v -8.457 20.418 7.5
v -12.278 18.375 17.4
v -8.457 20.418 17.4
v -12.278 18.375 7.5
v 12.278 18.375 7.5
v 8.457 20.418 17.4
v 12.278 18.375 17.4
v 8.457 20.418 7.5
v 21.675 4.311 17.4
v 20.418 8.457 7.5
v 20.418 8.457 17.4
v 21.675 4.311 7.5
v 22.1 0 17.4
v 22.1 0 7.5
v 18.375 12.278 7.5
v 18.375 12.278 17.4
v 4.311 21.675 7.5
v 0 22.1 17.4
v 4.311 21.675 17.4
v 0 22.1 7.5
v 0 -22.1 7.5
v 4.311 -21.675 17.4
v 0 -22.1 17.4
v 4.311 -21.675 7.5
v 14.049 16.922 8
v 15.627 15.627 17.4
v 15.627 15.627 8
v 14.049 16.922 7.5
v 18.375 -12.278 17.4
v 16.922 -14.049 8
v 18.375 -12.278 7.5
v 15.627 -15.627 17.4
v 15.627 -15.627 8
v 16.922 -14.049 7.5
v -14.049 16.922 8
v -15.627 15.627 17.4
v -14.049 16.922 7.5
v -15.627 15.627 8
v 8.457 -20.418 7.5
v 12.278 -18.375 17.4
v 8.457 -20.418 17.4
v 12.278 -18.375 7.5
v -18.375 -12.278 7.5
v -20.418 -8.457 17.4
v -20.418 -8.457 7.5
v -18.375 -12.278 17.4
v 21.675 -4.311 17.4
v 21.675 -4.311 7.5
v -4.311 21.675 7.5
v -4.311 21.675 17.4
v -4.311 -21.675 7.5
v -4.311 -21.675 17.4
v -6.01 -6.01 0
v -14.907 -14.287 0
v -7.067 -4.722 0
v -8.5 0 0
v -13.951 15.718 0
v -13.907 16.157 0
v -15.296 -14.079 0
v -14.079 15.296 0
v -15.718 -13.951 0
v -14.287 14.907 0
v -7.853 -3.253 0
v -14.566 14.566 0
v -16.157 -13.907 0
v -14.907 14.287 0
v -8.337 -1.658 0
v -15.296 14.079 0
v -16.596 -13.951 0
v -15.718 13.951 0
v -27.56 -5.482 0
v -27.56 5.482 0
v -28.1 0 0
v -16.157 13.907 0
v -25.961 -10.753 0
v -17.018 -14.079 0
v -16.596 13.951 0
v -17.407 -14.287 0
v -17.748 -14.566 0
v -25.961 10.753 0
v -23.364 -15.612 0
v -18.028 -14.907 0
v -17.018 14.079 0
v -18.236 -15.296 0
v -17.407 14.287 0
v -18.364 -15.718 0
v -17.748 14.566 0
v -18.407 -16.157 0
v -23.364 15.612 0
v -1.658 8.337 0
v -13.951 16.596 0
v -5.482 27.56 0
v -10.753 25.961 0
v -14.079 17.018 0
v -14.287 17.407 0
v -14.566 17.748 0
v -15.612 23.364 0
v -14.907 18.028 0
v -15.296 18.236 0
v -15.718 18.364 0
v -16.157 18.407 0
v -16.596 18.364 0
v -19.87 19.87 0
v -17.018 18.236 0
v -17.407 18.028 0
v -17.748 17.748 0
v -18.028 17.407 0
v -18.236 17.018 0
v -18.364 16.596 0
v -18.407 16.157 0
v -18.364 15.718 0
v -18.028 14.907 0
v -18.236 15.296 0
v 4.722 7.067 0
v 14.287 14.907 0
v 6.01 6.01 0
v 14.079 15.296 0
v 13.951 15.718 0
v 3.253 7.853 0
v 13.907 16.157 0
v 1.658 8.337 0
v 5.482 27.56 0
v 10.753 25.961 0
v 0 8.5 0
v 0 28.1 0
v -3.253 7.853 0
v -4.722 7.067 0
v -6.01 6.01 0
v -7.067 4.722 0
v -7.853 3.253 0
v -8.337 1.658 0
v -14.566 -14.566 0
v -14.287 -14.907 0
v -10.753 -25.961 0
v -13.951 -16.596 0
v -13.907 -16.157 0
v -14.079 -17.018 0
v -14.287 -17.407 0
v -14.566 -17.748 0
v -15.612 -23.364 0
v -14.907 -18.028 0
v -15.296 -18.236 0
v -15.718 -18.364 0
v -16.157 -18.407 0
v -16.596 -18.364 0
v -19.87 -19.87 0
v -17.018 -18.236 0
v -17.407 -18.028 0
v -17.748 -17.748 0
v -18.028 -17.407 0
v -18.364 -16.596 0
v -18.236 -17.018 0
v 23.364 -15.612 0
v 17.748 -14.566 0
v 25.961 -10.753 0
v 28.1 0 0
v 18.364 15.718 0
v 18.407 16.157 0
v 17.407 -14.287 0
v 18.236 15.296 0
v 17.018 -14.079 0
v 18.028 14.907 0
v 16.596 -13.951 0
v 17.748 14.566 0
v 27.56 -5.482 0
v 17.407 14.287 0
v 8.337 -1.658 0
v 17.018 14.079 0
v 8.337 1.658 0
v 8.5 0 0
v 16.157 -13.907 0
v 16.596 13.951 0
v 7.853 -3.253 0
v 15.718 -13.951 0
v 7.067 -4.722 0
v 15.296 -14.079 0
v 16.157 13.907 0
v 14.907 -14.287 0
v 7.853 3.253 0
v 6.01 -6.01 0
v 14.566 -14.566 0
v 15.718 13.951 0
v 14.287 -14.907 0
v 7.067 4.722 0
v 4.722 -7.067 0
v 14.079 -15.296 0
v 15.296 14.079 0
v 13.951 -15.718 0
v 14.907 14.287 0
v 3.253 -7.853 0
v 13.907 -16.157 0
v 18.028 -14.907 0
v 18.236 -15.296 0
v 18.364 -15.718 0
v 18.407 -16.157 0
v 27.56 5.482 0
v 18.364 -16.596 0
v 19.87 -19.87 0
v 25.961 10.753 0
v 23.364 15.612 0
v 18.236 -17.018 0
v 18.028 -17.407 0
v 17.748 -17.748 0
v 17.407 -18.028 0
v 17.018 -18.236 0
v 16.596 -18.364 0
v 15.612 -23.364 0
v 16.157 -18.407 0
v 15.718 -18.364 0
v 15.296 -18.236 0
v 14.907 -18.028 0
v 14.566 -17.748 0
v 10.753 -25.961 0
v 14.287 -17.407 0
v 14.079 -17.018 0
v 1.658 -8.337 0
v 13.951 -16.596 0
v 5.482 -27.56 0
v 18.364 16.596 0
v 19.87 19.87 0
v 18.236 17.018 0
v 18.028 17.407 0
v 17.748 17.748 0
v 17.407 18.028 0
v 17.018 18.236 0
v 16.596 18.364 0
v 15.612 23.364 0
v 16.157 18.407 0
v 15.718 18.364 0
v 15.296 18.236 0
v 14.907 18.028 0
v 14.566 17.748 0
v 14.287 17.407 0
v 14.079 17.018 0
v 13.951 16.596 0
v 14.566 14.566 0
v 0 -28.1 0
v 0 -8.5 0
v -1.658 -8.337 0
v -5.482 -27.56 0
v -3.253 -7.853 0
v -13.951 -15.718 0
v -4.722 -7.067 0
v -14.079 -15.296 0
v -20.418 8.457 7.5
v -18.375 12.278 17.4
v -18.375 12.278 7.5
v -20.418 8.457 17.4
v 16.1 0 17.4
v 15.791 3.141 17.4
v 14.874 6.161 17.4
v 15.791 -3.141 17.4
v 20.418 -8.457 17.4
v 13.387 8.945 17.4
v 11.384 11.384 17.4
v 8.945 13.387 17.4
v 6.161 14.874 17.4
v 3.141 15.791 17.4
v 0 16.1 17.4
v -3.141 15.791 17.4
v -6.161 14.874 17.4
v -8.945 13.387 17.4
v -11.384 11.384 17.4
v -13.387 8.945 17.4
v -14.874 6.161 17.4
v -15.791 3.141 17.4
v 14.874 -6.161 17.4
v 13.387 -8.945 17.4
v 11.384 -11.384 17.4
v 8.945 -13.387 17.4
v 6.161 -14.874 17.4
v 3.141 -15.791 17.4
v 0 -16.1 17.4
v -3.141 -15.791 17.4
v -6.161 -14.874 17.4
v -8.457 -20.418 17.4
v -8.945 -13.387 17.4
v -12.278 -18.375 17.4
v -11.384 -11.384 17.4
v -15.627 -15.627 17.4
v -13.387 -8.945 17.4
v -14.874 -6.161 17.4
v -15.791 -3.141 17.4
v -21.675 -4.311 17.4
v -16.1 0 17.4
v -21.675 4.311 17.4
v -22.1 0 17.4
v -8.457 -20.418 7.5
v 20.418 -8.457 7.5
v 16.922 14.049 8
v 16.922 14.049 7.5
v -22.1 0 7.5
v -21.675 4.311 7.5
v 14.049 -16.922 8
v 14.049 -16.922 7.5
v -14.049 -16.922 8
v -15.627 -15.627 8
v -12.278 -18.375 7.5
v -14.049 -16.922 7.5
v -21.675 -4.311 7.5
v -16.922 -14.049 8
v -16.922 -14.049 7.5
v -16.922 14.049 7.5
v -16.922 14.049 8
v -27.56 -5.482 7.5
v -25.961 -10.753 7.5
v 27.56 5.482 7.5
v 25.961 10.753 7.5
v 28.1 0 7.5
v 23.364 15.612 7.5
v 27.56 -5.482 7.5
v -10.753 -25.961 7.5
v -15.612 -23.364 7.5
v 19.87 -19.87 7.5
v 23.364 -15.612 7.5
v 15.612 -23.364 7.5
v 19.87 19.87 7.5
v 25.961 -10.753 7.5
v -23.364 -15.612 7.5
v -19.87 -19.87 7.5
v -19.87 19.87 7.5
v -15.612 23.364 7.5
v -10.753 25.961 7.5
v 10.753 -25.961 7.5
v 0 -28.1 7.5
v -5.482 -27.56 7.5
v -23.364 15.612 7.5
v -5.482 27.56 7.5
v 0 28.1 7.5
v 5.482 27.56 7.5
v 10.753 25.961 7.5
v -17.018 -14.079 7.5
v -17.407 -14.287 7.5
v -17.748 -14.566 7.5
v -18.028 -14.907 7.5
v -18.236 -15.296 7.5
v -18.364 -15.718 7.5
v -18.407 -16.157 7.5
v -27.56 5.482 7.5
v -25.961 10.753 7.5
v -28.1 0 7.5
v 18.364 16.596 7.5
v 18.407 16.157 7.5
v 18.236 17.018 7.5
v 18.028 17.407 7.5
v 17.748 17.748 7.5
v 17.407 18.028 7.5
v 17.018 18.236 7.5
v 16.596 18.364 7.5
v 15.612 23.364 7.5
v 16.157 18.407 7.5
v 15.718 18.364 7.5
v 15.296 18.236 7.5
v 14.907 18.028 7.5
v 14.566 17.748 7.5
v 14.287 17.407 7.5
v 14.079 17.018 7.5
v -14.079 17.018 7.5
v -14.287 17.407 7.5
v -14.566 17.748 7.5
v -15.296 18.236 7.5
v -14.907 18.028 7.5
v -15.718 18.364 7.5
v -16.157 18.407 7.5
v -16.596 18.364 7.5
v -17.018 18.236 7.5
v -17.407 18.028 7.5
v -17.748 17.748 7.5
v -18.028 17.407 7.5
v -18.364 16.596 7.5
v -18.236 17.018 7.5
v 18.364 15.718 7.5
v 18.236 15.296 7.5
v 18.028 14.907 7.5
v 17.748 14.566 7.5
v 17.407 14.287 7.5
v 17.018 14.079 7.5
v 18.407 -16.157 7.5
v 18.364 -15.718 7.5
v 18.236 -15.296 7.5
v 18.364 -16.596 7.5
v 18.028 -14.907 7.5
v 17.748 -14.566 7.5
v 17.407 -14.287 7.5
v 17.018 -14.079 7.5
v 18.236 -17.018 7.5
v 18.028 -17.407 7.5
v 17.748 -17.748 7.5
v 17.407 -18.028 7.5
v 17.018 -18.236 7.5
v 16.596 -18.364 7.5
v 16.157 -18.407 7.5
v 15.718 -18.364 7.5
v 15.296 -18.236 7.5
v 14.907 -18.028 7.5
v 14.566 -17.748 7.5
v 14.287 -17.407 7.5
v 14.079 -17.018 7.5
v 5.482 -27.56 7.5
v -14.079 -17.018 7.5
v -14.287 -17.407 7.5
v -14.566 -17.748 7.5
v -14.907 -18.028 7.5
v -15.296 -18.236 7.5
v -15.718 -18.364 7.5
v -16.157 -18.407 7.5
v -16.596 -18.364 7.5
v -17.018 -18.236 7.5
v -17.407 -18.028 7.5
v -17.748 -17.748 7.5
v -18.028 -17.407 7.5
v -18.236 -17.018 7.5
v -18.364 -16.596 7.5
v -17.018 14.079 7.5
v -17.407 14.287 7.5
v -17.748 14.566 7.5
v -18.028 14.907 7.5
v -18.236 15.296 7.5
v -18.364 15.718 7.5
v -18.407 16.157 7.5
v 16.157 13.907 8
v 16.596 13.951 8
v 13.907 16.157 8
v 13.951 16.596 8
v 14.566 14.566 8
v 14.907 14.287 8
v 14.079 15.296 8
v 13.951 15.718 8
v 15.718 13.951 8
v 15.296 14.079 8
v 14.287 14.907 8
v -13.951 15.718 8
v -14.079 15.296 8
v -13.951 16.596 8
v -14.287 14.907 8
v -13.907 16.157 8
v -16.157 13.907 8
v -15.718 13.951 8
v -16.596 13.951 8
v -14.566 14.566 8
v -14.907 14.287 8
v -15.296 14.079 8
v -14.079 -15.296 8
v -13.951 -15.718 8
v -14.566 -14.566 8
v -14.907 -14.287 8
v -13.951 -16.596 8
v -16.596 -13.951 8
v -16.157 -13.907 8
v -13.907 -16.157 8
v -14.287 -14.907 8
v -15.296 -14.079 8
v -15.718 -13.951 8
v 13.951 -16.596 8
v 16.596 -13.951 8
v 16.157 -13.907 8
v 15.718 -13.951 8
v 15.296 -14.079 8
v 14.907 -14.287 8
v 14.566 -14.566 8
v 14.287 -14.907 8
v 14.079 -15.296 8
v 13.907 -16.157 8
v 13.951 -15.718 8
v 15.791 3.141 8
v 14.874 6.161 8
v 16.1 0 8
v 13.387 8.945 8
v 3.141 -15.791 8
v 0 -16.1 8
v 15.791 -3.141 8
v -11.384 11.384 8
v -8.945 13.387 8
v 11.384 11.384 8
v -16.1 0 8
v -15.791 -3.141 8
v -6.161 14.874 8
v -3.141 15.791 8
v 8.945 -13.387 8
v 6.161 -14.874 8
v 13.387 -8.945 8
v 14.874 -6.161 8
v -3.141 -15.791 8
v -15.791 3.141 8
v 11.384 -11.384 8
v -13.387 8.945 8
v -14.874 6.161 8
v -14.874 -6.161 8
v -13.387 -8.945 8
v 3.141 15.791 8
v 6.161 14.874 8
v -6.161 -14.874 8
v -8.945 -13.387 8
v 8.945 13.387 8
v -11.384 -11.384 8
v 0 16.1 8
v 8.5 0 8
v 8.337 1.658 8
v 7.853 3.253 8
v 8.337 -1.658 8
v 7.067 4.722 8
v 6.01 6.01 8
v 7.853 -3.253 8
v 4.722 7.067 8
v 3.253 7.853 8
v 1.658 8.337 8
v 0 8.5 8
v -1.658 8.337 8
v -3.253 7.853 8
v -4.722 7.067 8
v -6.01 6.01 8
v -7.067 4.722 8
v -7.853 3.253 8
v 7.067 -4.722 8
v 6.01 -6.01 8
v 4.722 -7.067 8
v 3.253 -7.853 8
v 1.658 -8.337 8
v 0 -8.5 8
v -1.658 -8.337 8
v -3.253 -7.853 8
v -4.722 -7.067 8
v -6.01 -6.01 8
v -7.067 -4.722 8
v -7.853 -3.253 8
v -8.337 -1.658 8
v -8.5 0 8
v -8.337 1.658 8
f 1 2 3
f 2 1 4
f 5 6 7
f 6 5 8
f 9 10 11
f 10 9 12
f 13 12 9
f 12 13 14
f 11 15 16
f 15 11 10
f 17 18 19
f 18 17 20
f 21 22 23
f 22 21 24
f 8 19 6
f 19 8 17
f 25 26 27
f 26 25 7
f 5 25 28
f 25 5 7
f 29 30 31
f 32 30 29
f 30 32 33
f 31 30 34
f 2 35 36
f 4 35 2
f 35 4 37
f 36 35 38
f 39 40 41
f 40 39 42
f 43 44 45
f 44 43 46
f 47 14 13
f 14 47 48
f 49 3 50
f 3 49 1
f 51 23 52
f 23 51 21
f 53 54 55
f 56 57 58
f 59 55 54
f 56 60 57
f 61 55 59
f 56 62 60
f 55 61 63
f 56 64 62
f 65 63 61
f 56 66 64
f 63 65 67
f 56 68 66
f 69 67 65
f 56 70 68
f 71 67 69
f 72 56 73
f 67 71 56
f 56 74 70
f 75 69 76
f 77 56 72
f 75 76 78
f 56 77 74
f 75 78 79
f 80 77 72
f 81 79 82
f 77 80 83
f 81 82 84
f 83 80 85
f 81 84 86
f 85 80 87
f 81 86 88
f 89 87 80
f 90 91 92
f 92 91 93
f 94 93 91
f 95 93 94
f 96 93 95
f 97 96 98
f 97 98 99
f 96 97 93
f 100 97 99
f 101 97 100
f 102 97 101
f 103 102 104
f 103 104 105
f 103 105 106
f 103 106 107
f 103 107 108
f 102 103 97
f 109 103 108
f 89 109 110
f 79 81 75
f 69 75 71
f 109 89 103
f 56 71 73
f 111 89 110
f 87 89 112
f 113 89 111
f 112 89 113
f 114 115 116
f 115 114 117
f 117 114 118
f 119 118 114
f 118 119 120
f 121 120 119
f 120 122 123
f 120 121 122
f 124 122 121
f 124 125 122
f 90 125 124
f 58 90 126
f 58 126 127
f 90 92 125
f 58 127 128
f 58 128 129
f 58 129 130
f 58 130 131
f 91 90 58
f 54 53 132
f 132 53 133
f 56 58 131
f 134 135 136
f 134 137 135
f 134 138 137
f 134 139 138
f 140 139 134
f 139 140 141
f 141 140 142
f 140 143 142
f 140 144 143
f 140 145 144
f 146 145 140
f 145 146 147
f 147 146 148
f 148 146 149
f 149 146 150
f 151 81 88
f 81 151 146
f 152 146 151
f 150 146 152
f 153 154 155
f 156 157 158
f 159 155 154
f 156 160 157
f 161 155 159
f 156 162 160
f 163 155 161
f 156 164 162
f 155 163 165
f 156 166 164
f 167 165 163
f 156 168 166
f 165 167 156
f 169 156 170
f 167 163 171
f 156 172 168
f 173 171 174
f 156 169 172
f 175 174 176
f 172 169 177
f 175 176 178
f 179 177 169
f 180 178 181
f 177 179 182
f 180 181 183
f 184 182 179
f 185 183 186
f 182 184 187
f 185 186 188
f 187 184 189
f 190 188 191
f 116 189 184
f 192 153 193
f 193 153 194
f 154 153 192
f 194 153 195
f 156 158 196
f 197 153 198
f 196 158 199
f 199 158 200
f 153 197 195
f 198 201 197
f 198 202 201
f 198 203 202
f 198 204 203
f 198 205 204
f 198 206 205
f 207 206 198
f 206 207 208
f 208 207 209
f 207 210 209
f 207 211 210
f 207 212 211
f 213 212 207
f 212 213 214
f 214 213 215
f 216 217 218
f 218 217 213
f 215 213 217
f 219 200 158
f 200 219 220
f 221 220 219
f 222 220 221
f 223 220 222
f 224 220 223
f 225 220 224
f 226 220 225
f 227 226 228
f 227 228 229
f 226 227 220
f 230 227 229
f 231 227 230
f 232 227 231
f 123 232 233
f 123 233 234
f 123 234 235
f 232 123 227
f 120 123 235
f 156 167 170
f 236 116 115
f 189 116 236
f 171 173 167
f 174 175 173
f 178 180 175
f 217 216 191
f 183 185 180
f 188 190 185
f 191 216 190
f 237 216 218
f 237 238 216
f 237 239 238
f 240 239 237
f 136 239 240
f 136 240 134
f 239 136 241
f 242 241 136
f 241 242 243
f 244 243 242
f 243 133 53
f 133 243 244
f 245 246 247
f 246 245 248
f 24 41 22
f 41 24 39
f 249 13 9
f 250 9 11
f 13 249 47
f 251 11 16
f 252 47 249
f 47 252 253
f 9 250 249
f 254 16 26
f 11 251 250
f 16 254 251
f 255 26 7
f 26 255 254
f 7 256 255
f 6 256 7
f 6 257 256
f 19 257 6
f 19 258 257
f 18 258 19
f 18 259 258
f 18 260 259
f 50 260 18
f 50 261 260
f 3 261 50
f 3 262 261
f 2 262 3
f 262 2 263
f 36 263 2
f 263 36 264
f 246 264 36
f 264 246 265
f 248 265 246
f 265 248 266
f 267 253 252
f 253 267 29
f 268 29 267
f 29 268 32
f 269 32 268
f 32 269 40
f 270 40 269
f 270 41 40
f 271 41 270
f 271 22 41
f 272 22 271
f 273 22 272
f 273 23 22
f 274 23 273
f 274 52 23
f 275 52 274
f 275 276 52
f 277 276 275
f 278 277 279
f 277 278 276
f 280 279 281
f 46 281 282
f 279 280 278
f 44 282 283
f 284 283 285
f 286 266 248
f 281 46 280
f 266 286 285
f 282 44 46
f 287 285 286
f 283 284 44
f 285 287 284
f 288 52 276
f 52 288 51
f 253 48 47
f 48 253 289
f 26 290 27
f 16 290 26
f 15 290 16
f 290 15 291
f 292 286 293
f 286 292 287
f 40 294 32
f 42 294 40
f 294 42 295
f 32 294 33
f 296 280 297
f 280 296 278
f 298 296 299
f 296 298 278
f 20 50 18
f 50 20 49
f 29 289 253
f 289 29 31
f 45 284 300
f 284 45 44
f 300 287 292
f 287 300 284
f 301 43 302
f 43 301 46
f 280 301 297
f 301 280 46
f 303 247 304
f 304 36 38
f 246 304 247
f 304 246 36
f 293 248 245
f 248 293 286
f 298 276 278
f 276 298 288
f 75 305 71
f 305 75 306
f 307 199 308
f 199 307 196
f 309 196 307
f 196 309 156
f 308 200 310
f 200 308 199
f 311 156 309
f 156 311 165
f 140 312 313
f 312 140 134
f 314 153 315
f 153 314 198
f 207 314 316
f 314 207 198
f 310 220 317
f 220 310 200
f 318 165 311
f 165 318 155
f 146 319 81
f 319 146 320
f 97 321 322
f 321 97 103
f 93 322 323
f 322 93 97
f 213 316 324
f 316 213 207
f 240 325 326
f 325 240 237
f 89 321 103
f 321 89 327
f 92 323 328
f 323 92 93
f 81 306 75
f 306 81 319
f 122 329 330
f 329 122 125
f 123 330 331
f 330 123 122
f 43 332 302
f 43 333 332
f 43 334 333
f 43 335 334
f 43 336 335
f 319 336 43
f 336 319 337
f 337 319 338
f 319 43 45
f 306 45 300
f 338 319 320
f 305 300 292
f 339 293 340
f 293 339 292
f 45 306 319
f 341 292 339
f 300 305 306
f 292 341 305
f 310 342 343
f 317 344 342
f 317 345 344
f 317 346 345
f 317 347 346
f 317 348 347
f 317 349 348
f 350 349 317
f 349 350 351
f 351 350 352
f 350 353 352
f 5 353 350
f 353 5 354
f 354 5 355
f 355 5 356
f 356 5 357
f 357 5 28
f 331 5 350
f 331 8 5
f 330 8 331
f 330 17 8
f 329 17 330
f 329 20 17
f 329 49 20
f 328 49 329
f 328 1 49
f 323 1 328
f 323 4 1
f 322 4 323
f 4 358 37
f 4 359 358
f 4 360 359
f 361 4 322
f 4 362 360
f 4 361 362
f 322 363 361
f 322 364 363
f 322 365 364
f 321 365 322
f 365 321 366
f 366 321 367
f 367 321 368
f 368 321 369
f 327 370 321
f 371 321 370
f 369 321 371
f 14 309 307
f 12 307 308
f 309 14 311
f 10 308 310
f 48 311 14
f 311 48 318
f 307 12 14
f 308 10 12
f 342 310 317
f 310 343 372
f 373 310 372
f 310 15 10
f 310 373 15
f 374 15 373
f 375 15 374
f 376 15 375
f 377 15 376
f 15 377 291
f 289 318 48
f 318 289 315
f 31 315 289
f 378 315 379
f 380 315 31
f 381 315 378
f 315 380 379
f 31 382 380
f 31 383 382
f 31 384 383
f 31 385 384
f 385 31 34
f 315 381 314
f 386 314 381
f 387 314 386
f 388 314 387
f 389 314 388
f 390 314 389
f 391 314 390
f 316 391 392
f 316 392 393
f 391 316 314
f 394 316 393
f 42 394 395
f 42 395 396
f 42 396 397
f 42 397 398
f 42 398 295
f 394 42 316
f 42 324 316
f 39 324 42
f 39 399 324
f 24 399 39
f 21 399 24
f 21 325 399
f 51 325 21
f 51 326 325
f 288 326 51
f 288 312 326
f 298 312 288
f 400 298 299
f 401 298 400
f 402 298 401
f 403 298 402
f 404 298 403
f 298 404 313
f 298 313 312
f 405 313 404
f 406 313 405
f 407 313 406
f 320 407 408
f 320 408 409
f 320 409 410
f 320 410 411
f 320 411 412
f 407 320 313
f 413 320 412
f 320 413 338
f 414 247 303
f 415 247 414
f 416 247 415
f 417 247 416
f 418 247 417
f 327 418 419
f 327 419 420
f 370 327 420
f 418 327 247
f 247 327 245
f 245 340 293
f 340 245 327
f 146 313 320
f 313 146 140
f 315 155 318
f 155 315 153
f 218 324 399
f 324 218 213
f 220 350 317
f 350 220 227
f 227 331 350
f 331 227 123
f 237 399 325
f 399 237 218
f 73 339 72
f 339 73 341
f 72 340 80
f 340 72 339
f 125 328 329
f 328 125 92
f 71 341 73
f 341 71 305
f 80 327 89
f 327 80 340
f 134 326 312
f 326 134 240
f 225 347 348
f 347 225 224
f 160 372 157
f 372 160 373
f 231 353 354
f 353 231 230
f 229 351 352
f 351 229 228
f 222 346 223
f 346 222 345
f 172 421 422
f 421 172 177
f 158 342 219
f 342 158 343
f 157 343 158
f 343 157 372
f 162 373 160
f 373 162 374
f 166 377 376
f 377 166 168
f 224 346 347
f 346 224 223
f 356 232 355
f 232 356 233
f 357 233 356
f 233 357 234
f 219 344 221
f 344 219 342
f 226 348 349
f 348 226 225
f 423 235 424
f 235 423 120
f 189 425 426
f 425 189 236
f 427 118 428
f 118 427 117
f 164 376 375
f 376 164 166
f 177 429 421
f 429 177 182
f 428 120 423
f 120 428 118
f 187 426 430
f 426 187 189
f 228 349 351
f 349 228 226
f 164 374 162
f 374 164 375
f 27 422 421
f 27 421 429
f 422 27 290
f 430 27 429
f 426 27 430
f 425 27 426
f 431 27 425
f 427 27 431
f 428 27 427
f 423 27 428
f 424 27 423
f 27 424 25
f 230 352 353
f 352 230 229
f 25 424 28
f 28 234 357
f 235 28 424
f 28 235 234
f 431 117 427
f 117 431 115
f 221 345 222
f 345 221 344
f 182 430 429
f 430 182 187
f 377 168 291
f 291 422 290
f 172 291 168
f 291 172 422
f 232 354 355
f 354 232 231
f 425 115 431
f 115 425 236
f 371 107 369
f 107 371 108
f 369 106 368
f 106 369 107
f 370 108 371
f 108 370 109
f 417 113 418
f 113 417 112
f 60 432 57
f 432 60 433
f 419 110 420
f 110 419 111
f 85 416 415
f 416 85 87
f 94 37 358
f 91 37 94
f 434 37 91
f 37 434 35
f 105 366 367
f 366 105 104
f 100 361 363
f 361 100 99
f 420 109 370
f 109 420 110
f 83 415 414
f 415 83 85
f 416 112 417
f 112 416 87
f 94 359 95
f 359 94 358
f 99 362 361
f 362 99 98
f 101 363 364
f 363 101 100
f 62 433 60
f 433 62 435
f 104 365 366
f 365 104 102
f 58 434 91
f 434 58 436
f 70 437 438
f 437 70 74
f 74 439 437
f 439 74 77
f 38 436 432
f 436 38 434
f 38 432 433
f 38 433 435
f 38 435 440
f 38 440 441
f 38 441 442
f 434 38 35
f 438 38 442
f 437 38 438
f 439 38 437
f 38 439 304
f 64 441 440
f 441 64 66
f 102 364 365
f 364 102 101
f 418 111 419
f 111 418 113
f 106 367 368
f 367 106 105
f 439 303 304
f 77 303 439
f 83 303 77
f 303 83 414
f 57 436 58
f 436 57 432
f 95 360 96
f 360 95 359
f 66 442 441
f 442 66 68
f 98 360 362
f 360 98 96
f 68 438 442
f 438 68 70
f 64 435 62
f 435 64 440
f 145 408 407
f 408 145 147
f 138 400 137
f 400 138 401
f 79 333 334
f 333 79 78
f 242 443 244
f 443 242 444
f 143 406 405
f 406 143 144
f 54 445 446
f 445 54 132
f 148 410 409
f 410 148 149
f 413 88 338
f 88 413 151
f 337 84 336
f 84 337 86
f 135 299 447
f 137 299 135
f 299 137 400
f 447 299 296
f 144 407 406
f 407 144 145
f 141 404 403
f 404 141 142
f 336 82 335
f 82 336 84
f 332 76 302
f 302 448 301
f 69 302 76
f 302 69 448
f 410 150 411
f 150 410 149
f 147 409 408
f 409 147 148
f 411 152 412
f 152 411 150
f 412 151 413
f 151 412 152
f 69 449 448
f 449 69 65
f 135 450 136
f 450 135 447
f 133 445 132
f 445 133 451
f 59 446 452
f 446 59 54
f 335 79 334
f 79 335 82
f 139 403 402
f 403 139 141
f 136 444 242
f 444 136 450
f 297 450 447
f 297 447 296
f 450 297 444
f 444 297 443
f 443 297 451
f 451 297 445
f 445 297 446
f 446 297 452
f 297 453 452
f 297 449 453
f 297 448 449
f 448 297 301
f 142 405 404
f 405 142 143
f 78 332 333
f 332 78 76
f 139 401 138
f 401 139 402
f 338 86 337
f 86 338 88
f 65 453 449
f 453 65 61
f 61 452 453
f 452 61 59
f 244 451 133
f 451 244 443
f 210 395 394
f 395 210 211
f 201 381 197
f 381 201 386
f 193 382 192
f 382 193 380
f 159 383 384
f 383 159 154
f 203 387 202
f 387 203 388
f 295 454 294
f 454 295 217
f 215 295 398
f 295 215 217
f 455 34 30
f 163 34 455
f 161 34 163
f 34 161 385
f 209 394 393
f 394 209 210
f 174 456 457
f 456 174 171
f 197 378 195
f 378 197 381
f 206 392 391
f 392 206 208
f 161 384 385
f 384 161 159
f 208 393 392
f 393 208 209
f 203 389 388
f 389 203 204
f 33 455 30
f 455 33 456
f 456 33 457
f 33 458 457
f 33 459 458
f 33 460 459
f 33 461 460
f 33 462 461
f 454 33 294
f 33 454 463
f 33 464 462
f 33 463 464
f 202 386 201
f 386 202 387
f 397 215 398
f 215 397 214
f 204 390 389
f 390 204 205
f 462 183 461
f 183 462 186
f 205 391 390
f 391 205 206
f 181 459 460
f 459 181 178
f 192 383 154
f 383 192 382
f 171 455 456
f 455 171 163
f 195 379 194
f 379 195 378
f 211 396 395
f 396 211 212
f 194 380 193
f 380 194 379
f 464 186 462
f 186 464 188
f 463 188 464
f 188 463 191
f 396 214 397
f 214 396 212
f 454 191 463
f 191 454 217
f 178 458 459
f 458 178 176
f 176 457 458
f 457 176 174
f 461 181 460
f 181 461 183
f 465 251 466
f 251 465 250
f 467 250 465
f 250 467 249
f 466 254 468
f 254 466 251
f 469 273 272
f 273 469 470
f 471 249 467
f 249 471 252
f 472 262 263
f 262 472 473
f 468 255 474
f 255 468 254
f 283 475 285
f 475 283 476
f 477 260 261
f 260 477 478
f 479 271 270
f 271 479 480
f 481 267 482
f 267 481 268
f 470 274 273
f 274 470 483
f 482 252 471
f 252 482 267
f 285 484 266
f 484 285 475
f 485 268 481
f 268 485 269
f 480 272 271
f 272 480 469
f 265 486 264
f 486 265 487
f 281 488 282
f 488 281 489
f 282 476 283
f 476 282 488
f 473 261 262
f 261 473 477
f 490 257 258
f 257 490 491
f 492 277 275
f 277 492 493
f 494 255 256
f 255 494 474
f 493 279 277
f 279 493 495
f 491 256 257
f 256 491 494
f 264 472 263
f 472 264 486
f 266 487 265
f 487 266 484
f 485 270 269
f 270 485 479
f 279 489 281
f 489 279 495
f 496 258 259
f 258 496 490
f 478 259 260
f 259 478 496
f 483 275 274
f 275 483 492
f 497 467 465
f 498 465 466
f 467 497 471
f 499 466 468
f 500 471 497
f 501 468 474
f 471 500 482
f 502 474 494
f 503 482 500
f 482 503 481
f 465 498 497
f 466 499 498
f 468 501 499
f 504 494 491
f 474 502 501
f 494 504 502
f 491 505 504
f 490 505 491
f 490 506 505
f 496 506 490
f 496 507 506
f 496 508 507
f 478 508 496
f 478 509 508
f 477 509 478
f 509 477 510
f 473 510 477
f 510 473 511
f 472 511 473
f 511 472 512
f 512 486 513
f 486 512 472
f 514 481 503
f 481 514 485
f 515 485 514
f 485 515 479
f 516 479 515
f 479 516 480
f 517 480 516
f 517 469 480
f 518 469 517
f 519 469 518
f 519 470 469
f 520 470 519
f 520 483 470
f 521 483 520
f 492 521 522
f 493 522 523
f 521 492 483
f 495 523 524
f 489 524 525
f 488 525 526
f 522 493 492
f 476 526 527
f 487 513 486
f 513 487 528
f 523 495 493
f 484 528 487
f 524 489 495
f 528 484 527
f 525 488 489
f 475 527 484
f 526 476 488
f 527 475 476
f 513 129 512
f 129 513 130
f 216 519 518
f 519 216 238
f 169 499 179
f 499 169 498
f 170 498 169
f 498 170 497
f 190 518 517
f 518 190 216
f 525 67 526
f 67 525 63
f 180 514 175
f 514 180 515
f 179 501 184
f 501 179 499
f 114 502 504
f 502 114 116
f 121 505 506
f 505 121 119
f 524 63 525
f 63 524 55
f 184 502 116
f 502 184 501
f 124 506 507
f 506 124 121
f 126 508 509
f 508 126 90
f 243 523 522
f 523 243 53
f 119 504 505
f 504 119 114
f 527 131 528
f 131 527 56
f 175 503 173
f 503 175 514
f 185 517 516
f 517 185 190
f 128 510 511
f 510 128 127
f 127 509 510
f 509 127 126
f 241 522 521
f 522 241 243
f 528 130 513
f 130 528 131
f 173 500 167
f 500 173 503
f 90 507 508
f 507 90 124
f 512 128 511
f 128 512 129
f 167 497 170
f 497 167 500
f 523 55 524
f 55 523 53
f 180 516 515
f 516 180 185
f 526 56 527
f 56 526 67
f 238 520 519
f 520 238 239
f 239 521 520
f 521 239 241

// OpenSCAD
$fn = 32;

// ----------------------------------------------------------------------
// Bearing housing: seat for 6002 (32 x 9 mm), 44.2 mm body
// ----------------------------------------------------------------------

// --- parameters (mm) ---
case_d = 44.2;            // housing outside diameter
case_h = 17.4;            // overall housing height
rim_t = 6;                // wall thickness
bearing_seat = 32.2;      // 6002 seat, 0.2 mm clearance
seat_h = 9.4;             // pocket depth
shoulder = 2;             // shoulder under the bearing
pass_d = 17;              // shaft passage
ear_d = 56.2;             // mounting flange diameter
flange_t = 6;             // flange thickness
bolt_d = 4.5;             // flange bolt clearance
bolt_r = 22.85;           // flange bolt circle radius

module body() {
  cylinder(h = case_h, d = case_d);
}

module flange() {
  /* flange sunk 1.5 mm into the body */
  cylinder(h = flange_t + 1.5, d = ear_d);
}

difference() {
  union() {
    body();
    flange();
  }
  translate([0, 0, case_h - seat_h]) cylinder(h = seat_h + 1, d = bearing_seat);
  translate([0, 0, -1]) cylinder(h = case_h - seat_h + 1, d = pass_d);
  for (i = [0 : 3]) rotate([0, 0, 45 + i * 90]) translate([bolt_r, 0, -1])
    cylinder(h = flange_t + 3, d = bolt_d);
}
